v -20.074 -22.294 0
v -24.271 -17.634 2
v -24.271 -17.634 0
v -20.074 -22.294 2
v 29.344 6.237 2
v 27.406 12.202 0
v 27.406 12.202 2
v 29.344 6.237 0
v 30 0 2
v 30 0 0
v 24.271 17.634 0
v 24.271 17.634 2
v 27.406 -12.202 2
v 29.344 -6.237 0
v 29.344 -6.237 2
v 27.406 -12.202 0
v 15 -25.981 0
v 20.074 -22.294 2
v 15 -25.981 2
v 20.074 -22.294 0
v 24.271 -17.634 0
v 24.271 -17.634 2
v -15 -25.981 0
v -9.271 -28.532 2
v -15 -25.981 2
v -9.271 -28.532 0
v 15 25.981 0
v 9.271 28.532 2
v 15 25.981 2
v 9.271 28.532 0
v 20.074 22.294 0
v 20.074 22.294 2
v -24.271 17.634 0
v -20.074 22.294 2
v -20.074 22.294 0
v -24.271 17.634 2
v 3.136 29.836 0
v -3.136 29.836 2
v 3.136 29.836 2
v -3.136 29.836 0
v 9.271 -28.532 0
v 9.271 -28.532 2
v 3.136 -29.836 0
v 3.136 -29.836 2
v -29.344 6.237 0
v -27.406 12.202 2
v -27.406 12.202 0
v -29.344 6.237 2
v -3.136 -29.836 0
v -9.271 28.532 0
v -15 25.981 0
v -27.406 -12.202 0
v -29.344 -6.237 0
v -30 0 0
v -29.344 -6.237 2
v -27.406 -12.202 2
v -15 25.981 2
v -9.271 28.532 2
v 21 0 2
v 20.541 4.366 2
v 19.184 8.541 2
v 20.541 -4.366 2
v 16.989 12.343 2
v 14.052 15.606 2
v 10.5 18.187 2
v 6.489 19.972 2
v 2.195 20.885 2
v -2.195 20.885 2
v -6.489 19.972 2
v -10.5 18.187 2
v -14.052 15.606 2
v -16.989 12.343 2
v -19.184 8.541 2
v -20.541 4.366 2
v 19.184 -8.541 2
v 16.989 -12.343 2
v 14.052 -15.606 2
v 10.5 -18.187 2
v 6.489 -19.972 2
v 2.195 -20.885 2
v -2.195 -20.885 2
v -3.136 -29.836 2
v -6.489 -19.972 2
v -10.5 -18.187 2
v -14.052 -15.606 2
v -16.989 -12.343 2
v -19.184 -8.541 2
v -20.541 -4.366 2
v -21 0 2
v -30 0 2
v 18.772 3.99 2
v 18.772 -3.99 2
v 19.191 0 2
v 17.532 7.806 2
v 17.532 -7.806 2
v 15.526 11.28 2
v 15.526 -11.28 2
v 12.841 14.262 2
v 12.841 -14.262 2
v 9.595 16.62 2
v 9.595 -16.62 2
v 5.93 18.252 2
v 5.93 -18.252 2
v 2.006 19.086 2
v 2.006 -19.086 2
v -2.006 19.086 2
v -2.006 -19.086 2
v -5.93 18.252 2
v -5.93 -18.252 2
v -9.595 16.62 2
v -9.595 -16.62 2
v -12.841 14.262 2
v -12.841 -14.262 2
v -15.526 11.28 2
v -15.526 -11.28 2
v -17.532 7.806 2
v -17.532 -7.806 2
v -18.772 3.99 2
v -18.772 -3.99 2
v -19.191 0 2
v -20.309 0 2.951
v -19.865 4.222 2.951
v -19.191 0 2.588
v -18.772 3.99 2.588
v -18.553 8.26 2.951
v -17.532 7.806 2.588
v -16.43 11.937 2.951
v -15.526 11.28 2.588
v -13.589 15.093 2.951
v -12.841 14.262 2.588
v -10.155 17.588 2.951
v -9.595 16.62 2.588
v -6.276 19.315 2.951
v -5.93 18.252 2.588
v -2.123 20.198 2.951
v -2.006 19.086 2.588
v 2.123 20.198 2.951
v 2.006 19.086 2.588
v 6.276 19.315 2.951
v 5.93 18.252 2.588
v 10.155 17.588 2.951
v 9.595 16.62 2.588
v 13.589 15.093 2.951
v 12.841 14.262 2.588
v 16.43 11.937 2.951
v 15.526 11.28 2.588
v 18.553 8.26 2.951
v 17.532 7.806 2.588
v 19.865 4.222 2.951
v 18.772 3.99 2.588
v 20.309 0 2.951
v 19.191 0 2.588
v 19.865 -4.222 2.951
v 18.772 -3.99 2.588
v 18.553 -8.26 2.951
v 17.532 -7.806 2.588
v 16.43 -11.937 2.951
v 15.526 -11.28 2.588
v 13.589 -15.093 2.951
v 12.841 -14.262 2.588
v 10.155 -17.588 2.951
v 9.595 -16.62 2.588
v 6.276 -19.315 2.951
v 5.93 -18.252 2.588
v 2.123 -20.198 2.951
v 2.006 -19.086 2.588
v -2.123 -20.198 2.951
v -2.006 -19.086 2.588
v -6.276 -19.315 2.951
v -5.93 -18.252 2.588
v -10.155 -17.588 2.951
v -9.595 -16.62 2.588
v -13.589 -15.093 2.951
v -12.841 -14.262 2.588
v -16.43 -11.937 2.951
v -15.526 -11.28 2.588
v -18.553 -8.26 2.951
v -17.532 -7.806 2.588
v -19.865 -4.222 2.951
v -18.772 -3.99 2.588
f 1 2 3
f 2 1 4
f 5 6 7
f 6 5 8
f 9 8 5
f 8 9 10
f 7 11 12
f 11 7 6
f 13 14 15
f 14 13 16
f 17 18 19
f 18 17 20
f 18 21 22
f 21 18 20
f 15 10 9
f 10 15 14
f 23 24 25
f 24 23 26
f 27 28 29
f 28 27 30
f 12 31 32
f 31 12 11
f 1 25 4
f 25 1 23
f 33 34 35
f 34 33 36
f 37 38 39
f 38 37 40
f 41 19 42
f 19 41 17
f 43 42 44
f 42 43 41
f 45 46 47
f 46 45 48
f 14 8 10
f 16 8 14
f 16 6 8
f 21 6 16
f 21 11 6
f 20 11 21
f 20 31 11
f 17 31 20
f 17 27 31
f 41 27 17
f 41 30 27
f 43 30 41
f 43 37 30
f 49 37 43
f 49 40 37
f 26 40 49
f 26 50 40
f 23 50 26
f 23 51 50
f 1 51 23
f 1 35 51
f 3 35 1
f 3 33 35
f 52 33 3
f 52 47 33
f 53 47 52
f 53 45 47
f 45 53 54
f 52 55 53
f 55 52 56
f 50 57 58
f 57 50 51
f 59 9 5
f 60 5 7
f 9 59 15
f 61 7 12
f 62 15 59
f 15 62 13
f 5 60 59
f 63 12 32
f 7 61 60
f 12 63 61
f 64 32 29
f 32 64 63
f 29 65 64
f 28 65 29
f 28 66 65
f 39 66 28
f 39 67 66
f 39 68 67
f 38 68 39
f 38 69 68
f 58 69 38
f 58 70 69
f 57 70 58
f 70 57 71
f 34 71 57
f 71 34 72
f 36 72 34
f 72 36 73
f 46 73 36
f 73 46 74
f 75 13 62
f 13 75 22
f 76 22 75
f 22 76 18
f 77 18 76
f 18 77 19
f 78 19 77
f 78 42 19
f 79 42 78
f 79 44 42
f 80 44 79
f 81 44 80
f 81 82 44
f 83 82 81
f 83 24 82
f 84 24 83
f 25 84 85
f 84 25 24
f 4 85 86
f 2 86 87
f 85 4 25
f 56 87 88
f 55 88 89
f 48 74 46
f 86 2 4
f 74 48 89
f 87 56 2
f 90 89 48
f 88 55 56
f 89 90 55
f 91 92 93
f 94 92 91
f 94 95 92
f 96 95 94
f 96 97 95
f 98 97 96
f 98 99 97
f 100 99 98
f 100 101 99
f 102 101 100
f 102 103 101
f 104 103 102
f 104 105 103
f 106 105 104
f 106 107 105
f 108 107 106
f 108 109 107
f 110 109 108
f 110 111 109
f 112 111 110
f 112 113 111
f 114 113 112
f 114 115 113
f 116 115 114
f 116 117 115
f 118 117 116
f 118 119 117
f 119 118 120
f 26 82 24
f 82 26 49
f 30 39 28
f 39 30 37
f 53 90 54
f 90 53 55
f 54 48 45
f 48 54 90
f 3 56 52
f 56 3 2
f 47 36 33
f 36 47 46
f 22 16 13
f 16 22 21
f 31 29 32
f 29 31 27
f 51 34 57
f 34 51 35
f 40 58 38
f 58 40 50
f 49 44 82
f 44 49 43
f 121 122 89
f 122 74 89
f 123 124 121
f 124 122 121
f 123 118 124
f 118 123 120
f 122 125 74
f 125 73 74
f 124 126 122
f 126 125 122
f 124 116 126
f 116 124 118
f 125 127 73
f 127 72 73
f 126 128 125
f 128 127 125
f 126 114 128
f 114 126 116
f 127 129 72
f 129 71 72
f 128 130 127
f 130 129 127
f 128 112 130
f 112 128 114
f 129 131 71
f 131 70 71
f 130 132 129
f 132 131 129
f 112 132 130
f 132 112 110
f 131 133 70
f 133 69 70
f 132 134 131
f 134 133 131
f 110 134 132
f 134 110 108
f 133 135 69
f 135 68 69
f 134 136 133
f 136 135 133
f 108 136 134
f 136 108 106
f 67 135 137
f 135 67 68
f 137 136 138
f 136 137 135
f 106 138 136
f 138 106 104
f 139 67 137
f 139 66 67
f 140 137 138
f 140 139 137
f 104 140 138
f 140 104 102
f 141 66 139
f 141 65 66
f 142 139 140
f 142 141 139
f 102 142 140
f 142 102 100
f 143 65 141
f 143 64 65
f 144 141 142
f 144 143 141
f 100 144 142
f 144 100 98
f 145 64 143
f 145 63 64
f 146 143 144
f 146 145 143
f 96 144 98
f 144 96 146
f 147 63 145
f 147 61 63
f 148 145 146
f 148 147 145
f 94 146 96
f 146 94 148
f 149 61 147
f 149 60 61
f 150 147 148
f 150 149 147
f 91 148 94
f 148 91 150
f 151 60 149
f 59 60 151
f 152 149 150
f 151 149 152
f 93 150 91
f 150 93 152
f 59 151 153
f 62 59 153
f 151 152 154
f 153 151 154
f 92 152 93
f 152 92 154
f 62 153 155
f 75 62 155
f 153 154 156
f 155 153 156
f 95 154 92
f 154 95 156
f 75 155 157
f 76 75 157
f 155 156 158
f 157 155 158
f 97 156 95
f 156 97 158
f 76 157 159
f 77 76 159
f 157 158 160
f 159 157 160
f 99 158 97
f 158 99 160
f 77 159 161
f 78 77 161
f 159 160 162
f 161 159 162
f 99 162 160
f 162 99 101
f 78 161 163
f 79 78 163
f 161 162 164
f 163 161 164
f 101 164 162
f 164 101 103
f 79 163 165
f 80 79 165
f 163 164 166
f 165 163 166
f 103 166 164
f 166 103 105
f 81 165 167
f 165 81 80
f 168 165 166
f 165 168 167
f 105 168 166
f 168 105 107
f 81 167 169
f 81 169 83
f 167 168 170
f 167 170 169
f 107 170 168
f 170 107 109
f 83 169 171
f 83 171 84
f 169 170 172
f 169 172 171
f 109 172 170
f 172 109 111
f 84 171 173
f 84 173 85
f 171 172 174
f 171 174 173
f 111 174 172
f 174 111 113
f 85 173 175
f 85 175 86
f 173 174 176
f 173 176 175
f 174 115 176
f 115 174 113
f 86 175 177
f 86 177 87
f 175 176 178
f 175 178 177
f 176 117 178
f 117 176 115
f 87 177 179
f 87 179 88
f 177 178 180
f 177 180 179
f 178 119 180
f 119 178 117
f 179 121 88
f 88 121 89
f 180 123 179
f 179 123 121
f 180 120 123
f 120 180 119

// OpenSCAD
// F8b: Vereinigung Zylinder + rotate_extrude eines Kreises (Ring, halb eingetaucht): der Ring
// fehlt im Ergebnis (Volumen 5654,87 = nur der Zylinder, Schnittbild ohne Ring), ohne Meldung.
// Status (Bericht 13): behoben (Ursache wie F8a).
// SOLL-VOLUMEN: 5852.26 1
union() {
    cylinder(h = 2, r = 30);
    translate([0, 0, 2]) rotate_extrude() translate([20, 0]) circle(1);
}
